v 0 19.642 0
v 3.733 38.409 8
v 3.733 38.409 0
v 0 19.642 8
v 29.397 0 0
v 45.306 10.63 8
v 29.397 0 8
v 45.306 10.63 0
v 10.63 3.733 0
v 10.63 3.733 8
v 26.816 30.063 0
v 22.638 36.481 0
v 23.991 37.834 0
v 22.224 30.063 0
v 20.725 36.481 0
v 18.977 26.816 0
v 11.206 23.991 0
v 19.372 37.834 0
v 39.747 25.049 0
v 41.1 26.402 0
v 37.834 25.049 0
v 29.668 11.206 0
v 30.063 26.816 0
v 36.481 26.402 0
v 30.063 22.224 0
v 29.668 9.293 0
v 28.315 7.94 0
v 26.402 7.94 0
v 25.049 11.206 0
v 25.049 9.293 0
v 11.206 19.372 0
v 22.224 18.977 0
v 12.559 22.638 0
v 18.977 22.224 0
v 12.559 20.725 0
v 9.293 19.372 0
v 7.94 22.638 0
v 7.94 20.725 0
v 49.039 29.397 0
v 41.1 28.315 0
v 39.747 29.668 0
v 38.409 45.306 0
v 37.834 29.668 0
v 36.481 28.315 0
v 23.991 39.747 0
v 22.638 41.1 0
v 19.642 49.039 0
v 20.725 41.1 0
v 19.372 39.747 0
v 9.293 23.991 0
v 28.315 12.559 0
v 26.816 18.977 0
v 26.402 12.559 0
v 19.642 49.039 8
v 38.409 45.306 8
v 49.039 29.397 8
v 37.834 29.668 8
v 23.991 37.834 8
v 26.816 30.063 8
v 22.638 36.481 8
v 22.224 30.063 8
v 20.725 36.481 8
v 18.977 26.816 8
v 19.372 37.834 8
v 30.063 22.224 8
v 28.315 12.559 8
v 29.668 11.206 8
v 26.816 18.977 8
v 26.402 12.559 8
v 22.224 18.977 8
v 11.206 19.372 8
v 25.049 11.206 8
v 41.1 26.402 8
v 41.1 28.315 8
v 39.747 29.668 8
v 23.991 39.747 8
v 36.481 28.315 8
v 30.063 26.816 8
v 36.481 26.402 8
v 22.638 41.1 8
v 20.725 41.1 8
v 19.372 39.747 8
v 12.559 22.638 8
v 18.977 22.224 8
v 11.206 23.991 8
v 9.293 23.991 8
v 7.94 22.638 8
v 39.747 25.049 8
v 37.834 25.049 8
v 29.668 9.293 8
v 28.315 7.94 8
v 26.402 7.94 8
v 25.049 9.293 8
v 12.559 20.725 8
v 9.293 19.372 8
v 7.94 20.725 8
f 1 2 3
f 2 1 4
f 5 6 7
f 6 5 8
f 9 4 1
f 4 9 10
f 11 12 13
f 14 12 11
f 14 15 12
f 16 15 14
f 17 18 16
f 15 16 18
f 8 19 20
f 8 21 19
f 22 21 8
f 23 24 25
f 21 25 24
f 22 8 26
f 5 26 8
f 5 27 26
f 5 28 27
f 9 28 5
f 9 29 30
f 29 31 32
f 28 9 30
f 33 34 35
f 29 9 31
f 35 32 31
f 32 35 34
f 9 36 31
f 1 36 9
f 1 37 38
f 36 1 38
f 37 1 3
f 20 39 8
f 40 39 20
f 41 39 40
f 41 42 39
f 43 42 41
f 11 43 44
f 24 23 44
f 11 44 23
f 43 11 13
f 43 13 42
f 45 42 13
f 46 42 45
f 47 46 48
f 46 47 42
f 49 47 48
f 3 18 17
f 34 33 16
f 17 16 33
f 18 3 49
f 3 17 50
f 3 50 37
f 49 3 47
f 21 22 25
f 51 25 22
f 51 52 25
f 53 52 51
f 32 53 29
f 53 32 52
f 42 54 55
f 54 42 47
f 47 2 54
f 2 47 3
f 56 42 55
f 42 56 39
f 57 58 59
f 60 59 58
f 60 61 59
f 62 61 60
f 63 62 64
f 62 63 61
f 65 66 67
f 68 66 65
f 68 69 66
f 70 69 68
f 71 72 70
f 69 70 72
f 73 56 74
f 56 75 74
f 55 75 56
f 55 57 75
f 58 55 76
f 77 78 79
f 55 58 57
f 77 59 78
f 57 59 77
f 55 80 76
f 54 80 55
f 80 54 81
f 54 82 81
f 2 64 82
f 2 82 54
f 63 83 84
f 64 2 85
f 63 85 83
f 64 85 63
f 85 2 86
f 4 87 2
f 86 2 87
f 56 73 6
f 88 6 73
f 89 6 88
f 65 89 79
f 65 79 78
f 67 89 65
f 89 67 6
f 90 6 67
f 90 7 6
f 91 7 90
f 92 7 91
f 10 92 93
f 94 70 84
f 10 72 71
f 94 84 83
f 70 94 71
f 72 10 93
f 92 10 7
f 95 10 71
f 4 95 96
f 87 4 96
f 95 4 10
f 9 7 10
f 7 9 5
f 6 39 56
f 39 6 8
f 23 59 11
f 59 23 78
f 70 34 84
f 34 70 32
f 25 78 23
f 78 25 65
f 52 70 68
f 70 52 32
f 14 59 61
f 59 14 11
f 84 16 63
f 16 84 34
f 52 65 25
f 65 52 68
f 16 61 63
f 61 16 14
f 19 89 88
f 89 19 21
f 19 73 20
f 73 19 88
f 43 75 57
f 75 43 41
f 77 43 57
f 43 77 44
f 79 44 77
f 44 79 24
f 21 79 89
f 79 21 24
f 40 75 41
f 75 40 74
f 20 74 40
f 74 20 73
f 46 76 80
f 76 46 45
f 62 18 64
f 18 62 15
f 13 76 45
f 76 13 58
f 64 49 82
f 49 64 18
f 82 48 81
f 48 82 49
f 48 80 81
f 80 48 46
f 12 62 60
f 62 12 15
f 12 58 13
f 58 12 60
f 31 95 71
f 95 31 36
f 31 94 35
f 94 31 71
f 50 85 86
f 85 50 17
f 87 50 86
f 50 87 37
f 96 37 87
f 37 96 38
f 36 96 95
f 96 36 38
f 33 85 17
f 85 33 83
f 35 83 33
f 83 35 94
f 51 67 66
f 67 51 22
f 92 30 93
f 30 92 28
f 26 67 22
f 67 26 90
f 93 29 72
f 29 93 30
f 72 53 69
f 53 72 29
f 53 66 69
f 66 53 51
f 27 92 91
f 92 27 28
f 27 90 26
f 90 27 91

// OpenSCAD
$fn = 32;

// ----------------------------------------------------------------------
// Polygon plate: 8-gon R25, 4 bolt windows
// ----------------------------------------------------------------------

// --- parameters (mm) ---
sides = 8;                // number of polygon sides
plate_r = 25;             // circumscribed radius of the polygon
bore_r = 6;               // centre bore radius
bolts = 4;                // number of bolt windows
ring_r = 14.55;           // bolt-circle radius
bolt_r = 2.5;             // bolt window radius
plate_t = 8;              // plate thickness, Z (extrusion height)
fit_tol = 0.05;           // declared fit tolerance (prompt contract)
free_tol = 0.3;           // declared free tolerance (prompt contract)

plate_d = 2 * plate_r;  // circumscribed diameter
bore_d = 2 * bore_r;  // centre bore diameter
bolt_d = 2 * bolt_r;  // bolt window diameter
ring_d = 2 * ring_r;  // bolt-circle diameter

profile = [[49.039, 29.397], [38.409, 45.306], [19.642, 49.039], [3.733, 38.409], [0, 19.642], [10.63, 3.733], [29.397, 0], [45.306, 10.63]];  // primary outline, 8 points, counter clockwise
void_1 = [[30.063, 26.816], [26.816, 30.063], [22.224, 30.063], [18.977, 26.816], [18.977, 22.224], [22.224, 18.977], [26.816, 18.977], [30.063, 22.224]];  // centre bore, 8 points
void_2 = [[41.1, 28.315], [39.747, 29.668], [37.834, 29.668], [36.481, 28.315], [36.481, 26.402], [37.834, 25.049], [39.747, 25.049], [41.1, 26.402]];  // bolt window 1, 8 points
void_3 = [[23.991, 39.747], [22.638, 41.1], [20.725, 41.1], [19.372, 39.747], [19.372, 37.834], [20.725, 36.481], [22.638, 36.481], [23.991, 37.834]];  // bolt window 2, 8 points
void_4 = [[12.559, 22.638], [11.206, 23.991], [9.293, 23.991], [7.94, 22.638], [7.94, 20.725], [9.293, 19.372], [11.206, 19.372], [12.559, 20.725]];  // bolt window 3, 8 points
void_5 = [[29.668, 11.206], [28.315, 12.559], [26.402, 12.559], [25.049, 11.206], [25.049, 9.293], [26.402, 7.94], [28.315, 7.94], [29.668, 9.293]];  // bolt window 4, 8 points

// --- the one profile operation ---
difference() {
  linear_extrude(height = plate_t) polygon(points = profile);
  translate([0, 0, -1])
    linear_extrude(height = plate_t + 2) polygon(points = void_1);
  translate([0, 0, -1])
    linear_extrude(height = plate_t + 2) polygon(points = void_2);
  translate([0, 0, -1])
    linear_extrude(height = plate_t + 2) polygon(points = void_3);
  translate([0, 0, -1])
    linear_extrude(height = plate_t + 2) polygon(points = void_4);
  translate([0, 0, -1])
    linear_extrude(height = plate_t + 2) polygon(points = void_5);
}
